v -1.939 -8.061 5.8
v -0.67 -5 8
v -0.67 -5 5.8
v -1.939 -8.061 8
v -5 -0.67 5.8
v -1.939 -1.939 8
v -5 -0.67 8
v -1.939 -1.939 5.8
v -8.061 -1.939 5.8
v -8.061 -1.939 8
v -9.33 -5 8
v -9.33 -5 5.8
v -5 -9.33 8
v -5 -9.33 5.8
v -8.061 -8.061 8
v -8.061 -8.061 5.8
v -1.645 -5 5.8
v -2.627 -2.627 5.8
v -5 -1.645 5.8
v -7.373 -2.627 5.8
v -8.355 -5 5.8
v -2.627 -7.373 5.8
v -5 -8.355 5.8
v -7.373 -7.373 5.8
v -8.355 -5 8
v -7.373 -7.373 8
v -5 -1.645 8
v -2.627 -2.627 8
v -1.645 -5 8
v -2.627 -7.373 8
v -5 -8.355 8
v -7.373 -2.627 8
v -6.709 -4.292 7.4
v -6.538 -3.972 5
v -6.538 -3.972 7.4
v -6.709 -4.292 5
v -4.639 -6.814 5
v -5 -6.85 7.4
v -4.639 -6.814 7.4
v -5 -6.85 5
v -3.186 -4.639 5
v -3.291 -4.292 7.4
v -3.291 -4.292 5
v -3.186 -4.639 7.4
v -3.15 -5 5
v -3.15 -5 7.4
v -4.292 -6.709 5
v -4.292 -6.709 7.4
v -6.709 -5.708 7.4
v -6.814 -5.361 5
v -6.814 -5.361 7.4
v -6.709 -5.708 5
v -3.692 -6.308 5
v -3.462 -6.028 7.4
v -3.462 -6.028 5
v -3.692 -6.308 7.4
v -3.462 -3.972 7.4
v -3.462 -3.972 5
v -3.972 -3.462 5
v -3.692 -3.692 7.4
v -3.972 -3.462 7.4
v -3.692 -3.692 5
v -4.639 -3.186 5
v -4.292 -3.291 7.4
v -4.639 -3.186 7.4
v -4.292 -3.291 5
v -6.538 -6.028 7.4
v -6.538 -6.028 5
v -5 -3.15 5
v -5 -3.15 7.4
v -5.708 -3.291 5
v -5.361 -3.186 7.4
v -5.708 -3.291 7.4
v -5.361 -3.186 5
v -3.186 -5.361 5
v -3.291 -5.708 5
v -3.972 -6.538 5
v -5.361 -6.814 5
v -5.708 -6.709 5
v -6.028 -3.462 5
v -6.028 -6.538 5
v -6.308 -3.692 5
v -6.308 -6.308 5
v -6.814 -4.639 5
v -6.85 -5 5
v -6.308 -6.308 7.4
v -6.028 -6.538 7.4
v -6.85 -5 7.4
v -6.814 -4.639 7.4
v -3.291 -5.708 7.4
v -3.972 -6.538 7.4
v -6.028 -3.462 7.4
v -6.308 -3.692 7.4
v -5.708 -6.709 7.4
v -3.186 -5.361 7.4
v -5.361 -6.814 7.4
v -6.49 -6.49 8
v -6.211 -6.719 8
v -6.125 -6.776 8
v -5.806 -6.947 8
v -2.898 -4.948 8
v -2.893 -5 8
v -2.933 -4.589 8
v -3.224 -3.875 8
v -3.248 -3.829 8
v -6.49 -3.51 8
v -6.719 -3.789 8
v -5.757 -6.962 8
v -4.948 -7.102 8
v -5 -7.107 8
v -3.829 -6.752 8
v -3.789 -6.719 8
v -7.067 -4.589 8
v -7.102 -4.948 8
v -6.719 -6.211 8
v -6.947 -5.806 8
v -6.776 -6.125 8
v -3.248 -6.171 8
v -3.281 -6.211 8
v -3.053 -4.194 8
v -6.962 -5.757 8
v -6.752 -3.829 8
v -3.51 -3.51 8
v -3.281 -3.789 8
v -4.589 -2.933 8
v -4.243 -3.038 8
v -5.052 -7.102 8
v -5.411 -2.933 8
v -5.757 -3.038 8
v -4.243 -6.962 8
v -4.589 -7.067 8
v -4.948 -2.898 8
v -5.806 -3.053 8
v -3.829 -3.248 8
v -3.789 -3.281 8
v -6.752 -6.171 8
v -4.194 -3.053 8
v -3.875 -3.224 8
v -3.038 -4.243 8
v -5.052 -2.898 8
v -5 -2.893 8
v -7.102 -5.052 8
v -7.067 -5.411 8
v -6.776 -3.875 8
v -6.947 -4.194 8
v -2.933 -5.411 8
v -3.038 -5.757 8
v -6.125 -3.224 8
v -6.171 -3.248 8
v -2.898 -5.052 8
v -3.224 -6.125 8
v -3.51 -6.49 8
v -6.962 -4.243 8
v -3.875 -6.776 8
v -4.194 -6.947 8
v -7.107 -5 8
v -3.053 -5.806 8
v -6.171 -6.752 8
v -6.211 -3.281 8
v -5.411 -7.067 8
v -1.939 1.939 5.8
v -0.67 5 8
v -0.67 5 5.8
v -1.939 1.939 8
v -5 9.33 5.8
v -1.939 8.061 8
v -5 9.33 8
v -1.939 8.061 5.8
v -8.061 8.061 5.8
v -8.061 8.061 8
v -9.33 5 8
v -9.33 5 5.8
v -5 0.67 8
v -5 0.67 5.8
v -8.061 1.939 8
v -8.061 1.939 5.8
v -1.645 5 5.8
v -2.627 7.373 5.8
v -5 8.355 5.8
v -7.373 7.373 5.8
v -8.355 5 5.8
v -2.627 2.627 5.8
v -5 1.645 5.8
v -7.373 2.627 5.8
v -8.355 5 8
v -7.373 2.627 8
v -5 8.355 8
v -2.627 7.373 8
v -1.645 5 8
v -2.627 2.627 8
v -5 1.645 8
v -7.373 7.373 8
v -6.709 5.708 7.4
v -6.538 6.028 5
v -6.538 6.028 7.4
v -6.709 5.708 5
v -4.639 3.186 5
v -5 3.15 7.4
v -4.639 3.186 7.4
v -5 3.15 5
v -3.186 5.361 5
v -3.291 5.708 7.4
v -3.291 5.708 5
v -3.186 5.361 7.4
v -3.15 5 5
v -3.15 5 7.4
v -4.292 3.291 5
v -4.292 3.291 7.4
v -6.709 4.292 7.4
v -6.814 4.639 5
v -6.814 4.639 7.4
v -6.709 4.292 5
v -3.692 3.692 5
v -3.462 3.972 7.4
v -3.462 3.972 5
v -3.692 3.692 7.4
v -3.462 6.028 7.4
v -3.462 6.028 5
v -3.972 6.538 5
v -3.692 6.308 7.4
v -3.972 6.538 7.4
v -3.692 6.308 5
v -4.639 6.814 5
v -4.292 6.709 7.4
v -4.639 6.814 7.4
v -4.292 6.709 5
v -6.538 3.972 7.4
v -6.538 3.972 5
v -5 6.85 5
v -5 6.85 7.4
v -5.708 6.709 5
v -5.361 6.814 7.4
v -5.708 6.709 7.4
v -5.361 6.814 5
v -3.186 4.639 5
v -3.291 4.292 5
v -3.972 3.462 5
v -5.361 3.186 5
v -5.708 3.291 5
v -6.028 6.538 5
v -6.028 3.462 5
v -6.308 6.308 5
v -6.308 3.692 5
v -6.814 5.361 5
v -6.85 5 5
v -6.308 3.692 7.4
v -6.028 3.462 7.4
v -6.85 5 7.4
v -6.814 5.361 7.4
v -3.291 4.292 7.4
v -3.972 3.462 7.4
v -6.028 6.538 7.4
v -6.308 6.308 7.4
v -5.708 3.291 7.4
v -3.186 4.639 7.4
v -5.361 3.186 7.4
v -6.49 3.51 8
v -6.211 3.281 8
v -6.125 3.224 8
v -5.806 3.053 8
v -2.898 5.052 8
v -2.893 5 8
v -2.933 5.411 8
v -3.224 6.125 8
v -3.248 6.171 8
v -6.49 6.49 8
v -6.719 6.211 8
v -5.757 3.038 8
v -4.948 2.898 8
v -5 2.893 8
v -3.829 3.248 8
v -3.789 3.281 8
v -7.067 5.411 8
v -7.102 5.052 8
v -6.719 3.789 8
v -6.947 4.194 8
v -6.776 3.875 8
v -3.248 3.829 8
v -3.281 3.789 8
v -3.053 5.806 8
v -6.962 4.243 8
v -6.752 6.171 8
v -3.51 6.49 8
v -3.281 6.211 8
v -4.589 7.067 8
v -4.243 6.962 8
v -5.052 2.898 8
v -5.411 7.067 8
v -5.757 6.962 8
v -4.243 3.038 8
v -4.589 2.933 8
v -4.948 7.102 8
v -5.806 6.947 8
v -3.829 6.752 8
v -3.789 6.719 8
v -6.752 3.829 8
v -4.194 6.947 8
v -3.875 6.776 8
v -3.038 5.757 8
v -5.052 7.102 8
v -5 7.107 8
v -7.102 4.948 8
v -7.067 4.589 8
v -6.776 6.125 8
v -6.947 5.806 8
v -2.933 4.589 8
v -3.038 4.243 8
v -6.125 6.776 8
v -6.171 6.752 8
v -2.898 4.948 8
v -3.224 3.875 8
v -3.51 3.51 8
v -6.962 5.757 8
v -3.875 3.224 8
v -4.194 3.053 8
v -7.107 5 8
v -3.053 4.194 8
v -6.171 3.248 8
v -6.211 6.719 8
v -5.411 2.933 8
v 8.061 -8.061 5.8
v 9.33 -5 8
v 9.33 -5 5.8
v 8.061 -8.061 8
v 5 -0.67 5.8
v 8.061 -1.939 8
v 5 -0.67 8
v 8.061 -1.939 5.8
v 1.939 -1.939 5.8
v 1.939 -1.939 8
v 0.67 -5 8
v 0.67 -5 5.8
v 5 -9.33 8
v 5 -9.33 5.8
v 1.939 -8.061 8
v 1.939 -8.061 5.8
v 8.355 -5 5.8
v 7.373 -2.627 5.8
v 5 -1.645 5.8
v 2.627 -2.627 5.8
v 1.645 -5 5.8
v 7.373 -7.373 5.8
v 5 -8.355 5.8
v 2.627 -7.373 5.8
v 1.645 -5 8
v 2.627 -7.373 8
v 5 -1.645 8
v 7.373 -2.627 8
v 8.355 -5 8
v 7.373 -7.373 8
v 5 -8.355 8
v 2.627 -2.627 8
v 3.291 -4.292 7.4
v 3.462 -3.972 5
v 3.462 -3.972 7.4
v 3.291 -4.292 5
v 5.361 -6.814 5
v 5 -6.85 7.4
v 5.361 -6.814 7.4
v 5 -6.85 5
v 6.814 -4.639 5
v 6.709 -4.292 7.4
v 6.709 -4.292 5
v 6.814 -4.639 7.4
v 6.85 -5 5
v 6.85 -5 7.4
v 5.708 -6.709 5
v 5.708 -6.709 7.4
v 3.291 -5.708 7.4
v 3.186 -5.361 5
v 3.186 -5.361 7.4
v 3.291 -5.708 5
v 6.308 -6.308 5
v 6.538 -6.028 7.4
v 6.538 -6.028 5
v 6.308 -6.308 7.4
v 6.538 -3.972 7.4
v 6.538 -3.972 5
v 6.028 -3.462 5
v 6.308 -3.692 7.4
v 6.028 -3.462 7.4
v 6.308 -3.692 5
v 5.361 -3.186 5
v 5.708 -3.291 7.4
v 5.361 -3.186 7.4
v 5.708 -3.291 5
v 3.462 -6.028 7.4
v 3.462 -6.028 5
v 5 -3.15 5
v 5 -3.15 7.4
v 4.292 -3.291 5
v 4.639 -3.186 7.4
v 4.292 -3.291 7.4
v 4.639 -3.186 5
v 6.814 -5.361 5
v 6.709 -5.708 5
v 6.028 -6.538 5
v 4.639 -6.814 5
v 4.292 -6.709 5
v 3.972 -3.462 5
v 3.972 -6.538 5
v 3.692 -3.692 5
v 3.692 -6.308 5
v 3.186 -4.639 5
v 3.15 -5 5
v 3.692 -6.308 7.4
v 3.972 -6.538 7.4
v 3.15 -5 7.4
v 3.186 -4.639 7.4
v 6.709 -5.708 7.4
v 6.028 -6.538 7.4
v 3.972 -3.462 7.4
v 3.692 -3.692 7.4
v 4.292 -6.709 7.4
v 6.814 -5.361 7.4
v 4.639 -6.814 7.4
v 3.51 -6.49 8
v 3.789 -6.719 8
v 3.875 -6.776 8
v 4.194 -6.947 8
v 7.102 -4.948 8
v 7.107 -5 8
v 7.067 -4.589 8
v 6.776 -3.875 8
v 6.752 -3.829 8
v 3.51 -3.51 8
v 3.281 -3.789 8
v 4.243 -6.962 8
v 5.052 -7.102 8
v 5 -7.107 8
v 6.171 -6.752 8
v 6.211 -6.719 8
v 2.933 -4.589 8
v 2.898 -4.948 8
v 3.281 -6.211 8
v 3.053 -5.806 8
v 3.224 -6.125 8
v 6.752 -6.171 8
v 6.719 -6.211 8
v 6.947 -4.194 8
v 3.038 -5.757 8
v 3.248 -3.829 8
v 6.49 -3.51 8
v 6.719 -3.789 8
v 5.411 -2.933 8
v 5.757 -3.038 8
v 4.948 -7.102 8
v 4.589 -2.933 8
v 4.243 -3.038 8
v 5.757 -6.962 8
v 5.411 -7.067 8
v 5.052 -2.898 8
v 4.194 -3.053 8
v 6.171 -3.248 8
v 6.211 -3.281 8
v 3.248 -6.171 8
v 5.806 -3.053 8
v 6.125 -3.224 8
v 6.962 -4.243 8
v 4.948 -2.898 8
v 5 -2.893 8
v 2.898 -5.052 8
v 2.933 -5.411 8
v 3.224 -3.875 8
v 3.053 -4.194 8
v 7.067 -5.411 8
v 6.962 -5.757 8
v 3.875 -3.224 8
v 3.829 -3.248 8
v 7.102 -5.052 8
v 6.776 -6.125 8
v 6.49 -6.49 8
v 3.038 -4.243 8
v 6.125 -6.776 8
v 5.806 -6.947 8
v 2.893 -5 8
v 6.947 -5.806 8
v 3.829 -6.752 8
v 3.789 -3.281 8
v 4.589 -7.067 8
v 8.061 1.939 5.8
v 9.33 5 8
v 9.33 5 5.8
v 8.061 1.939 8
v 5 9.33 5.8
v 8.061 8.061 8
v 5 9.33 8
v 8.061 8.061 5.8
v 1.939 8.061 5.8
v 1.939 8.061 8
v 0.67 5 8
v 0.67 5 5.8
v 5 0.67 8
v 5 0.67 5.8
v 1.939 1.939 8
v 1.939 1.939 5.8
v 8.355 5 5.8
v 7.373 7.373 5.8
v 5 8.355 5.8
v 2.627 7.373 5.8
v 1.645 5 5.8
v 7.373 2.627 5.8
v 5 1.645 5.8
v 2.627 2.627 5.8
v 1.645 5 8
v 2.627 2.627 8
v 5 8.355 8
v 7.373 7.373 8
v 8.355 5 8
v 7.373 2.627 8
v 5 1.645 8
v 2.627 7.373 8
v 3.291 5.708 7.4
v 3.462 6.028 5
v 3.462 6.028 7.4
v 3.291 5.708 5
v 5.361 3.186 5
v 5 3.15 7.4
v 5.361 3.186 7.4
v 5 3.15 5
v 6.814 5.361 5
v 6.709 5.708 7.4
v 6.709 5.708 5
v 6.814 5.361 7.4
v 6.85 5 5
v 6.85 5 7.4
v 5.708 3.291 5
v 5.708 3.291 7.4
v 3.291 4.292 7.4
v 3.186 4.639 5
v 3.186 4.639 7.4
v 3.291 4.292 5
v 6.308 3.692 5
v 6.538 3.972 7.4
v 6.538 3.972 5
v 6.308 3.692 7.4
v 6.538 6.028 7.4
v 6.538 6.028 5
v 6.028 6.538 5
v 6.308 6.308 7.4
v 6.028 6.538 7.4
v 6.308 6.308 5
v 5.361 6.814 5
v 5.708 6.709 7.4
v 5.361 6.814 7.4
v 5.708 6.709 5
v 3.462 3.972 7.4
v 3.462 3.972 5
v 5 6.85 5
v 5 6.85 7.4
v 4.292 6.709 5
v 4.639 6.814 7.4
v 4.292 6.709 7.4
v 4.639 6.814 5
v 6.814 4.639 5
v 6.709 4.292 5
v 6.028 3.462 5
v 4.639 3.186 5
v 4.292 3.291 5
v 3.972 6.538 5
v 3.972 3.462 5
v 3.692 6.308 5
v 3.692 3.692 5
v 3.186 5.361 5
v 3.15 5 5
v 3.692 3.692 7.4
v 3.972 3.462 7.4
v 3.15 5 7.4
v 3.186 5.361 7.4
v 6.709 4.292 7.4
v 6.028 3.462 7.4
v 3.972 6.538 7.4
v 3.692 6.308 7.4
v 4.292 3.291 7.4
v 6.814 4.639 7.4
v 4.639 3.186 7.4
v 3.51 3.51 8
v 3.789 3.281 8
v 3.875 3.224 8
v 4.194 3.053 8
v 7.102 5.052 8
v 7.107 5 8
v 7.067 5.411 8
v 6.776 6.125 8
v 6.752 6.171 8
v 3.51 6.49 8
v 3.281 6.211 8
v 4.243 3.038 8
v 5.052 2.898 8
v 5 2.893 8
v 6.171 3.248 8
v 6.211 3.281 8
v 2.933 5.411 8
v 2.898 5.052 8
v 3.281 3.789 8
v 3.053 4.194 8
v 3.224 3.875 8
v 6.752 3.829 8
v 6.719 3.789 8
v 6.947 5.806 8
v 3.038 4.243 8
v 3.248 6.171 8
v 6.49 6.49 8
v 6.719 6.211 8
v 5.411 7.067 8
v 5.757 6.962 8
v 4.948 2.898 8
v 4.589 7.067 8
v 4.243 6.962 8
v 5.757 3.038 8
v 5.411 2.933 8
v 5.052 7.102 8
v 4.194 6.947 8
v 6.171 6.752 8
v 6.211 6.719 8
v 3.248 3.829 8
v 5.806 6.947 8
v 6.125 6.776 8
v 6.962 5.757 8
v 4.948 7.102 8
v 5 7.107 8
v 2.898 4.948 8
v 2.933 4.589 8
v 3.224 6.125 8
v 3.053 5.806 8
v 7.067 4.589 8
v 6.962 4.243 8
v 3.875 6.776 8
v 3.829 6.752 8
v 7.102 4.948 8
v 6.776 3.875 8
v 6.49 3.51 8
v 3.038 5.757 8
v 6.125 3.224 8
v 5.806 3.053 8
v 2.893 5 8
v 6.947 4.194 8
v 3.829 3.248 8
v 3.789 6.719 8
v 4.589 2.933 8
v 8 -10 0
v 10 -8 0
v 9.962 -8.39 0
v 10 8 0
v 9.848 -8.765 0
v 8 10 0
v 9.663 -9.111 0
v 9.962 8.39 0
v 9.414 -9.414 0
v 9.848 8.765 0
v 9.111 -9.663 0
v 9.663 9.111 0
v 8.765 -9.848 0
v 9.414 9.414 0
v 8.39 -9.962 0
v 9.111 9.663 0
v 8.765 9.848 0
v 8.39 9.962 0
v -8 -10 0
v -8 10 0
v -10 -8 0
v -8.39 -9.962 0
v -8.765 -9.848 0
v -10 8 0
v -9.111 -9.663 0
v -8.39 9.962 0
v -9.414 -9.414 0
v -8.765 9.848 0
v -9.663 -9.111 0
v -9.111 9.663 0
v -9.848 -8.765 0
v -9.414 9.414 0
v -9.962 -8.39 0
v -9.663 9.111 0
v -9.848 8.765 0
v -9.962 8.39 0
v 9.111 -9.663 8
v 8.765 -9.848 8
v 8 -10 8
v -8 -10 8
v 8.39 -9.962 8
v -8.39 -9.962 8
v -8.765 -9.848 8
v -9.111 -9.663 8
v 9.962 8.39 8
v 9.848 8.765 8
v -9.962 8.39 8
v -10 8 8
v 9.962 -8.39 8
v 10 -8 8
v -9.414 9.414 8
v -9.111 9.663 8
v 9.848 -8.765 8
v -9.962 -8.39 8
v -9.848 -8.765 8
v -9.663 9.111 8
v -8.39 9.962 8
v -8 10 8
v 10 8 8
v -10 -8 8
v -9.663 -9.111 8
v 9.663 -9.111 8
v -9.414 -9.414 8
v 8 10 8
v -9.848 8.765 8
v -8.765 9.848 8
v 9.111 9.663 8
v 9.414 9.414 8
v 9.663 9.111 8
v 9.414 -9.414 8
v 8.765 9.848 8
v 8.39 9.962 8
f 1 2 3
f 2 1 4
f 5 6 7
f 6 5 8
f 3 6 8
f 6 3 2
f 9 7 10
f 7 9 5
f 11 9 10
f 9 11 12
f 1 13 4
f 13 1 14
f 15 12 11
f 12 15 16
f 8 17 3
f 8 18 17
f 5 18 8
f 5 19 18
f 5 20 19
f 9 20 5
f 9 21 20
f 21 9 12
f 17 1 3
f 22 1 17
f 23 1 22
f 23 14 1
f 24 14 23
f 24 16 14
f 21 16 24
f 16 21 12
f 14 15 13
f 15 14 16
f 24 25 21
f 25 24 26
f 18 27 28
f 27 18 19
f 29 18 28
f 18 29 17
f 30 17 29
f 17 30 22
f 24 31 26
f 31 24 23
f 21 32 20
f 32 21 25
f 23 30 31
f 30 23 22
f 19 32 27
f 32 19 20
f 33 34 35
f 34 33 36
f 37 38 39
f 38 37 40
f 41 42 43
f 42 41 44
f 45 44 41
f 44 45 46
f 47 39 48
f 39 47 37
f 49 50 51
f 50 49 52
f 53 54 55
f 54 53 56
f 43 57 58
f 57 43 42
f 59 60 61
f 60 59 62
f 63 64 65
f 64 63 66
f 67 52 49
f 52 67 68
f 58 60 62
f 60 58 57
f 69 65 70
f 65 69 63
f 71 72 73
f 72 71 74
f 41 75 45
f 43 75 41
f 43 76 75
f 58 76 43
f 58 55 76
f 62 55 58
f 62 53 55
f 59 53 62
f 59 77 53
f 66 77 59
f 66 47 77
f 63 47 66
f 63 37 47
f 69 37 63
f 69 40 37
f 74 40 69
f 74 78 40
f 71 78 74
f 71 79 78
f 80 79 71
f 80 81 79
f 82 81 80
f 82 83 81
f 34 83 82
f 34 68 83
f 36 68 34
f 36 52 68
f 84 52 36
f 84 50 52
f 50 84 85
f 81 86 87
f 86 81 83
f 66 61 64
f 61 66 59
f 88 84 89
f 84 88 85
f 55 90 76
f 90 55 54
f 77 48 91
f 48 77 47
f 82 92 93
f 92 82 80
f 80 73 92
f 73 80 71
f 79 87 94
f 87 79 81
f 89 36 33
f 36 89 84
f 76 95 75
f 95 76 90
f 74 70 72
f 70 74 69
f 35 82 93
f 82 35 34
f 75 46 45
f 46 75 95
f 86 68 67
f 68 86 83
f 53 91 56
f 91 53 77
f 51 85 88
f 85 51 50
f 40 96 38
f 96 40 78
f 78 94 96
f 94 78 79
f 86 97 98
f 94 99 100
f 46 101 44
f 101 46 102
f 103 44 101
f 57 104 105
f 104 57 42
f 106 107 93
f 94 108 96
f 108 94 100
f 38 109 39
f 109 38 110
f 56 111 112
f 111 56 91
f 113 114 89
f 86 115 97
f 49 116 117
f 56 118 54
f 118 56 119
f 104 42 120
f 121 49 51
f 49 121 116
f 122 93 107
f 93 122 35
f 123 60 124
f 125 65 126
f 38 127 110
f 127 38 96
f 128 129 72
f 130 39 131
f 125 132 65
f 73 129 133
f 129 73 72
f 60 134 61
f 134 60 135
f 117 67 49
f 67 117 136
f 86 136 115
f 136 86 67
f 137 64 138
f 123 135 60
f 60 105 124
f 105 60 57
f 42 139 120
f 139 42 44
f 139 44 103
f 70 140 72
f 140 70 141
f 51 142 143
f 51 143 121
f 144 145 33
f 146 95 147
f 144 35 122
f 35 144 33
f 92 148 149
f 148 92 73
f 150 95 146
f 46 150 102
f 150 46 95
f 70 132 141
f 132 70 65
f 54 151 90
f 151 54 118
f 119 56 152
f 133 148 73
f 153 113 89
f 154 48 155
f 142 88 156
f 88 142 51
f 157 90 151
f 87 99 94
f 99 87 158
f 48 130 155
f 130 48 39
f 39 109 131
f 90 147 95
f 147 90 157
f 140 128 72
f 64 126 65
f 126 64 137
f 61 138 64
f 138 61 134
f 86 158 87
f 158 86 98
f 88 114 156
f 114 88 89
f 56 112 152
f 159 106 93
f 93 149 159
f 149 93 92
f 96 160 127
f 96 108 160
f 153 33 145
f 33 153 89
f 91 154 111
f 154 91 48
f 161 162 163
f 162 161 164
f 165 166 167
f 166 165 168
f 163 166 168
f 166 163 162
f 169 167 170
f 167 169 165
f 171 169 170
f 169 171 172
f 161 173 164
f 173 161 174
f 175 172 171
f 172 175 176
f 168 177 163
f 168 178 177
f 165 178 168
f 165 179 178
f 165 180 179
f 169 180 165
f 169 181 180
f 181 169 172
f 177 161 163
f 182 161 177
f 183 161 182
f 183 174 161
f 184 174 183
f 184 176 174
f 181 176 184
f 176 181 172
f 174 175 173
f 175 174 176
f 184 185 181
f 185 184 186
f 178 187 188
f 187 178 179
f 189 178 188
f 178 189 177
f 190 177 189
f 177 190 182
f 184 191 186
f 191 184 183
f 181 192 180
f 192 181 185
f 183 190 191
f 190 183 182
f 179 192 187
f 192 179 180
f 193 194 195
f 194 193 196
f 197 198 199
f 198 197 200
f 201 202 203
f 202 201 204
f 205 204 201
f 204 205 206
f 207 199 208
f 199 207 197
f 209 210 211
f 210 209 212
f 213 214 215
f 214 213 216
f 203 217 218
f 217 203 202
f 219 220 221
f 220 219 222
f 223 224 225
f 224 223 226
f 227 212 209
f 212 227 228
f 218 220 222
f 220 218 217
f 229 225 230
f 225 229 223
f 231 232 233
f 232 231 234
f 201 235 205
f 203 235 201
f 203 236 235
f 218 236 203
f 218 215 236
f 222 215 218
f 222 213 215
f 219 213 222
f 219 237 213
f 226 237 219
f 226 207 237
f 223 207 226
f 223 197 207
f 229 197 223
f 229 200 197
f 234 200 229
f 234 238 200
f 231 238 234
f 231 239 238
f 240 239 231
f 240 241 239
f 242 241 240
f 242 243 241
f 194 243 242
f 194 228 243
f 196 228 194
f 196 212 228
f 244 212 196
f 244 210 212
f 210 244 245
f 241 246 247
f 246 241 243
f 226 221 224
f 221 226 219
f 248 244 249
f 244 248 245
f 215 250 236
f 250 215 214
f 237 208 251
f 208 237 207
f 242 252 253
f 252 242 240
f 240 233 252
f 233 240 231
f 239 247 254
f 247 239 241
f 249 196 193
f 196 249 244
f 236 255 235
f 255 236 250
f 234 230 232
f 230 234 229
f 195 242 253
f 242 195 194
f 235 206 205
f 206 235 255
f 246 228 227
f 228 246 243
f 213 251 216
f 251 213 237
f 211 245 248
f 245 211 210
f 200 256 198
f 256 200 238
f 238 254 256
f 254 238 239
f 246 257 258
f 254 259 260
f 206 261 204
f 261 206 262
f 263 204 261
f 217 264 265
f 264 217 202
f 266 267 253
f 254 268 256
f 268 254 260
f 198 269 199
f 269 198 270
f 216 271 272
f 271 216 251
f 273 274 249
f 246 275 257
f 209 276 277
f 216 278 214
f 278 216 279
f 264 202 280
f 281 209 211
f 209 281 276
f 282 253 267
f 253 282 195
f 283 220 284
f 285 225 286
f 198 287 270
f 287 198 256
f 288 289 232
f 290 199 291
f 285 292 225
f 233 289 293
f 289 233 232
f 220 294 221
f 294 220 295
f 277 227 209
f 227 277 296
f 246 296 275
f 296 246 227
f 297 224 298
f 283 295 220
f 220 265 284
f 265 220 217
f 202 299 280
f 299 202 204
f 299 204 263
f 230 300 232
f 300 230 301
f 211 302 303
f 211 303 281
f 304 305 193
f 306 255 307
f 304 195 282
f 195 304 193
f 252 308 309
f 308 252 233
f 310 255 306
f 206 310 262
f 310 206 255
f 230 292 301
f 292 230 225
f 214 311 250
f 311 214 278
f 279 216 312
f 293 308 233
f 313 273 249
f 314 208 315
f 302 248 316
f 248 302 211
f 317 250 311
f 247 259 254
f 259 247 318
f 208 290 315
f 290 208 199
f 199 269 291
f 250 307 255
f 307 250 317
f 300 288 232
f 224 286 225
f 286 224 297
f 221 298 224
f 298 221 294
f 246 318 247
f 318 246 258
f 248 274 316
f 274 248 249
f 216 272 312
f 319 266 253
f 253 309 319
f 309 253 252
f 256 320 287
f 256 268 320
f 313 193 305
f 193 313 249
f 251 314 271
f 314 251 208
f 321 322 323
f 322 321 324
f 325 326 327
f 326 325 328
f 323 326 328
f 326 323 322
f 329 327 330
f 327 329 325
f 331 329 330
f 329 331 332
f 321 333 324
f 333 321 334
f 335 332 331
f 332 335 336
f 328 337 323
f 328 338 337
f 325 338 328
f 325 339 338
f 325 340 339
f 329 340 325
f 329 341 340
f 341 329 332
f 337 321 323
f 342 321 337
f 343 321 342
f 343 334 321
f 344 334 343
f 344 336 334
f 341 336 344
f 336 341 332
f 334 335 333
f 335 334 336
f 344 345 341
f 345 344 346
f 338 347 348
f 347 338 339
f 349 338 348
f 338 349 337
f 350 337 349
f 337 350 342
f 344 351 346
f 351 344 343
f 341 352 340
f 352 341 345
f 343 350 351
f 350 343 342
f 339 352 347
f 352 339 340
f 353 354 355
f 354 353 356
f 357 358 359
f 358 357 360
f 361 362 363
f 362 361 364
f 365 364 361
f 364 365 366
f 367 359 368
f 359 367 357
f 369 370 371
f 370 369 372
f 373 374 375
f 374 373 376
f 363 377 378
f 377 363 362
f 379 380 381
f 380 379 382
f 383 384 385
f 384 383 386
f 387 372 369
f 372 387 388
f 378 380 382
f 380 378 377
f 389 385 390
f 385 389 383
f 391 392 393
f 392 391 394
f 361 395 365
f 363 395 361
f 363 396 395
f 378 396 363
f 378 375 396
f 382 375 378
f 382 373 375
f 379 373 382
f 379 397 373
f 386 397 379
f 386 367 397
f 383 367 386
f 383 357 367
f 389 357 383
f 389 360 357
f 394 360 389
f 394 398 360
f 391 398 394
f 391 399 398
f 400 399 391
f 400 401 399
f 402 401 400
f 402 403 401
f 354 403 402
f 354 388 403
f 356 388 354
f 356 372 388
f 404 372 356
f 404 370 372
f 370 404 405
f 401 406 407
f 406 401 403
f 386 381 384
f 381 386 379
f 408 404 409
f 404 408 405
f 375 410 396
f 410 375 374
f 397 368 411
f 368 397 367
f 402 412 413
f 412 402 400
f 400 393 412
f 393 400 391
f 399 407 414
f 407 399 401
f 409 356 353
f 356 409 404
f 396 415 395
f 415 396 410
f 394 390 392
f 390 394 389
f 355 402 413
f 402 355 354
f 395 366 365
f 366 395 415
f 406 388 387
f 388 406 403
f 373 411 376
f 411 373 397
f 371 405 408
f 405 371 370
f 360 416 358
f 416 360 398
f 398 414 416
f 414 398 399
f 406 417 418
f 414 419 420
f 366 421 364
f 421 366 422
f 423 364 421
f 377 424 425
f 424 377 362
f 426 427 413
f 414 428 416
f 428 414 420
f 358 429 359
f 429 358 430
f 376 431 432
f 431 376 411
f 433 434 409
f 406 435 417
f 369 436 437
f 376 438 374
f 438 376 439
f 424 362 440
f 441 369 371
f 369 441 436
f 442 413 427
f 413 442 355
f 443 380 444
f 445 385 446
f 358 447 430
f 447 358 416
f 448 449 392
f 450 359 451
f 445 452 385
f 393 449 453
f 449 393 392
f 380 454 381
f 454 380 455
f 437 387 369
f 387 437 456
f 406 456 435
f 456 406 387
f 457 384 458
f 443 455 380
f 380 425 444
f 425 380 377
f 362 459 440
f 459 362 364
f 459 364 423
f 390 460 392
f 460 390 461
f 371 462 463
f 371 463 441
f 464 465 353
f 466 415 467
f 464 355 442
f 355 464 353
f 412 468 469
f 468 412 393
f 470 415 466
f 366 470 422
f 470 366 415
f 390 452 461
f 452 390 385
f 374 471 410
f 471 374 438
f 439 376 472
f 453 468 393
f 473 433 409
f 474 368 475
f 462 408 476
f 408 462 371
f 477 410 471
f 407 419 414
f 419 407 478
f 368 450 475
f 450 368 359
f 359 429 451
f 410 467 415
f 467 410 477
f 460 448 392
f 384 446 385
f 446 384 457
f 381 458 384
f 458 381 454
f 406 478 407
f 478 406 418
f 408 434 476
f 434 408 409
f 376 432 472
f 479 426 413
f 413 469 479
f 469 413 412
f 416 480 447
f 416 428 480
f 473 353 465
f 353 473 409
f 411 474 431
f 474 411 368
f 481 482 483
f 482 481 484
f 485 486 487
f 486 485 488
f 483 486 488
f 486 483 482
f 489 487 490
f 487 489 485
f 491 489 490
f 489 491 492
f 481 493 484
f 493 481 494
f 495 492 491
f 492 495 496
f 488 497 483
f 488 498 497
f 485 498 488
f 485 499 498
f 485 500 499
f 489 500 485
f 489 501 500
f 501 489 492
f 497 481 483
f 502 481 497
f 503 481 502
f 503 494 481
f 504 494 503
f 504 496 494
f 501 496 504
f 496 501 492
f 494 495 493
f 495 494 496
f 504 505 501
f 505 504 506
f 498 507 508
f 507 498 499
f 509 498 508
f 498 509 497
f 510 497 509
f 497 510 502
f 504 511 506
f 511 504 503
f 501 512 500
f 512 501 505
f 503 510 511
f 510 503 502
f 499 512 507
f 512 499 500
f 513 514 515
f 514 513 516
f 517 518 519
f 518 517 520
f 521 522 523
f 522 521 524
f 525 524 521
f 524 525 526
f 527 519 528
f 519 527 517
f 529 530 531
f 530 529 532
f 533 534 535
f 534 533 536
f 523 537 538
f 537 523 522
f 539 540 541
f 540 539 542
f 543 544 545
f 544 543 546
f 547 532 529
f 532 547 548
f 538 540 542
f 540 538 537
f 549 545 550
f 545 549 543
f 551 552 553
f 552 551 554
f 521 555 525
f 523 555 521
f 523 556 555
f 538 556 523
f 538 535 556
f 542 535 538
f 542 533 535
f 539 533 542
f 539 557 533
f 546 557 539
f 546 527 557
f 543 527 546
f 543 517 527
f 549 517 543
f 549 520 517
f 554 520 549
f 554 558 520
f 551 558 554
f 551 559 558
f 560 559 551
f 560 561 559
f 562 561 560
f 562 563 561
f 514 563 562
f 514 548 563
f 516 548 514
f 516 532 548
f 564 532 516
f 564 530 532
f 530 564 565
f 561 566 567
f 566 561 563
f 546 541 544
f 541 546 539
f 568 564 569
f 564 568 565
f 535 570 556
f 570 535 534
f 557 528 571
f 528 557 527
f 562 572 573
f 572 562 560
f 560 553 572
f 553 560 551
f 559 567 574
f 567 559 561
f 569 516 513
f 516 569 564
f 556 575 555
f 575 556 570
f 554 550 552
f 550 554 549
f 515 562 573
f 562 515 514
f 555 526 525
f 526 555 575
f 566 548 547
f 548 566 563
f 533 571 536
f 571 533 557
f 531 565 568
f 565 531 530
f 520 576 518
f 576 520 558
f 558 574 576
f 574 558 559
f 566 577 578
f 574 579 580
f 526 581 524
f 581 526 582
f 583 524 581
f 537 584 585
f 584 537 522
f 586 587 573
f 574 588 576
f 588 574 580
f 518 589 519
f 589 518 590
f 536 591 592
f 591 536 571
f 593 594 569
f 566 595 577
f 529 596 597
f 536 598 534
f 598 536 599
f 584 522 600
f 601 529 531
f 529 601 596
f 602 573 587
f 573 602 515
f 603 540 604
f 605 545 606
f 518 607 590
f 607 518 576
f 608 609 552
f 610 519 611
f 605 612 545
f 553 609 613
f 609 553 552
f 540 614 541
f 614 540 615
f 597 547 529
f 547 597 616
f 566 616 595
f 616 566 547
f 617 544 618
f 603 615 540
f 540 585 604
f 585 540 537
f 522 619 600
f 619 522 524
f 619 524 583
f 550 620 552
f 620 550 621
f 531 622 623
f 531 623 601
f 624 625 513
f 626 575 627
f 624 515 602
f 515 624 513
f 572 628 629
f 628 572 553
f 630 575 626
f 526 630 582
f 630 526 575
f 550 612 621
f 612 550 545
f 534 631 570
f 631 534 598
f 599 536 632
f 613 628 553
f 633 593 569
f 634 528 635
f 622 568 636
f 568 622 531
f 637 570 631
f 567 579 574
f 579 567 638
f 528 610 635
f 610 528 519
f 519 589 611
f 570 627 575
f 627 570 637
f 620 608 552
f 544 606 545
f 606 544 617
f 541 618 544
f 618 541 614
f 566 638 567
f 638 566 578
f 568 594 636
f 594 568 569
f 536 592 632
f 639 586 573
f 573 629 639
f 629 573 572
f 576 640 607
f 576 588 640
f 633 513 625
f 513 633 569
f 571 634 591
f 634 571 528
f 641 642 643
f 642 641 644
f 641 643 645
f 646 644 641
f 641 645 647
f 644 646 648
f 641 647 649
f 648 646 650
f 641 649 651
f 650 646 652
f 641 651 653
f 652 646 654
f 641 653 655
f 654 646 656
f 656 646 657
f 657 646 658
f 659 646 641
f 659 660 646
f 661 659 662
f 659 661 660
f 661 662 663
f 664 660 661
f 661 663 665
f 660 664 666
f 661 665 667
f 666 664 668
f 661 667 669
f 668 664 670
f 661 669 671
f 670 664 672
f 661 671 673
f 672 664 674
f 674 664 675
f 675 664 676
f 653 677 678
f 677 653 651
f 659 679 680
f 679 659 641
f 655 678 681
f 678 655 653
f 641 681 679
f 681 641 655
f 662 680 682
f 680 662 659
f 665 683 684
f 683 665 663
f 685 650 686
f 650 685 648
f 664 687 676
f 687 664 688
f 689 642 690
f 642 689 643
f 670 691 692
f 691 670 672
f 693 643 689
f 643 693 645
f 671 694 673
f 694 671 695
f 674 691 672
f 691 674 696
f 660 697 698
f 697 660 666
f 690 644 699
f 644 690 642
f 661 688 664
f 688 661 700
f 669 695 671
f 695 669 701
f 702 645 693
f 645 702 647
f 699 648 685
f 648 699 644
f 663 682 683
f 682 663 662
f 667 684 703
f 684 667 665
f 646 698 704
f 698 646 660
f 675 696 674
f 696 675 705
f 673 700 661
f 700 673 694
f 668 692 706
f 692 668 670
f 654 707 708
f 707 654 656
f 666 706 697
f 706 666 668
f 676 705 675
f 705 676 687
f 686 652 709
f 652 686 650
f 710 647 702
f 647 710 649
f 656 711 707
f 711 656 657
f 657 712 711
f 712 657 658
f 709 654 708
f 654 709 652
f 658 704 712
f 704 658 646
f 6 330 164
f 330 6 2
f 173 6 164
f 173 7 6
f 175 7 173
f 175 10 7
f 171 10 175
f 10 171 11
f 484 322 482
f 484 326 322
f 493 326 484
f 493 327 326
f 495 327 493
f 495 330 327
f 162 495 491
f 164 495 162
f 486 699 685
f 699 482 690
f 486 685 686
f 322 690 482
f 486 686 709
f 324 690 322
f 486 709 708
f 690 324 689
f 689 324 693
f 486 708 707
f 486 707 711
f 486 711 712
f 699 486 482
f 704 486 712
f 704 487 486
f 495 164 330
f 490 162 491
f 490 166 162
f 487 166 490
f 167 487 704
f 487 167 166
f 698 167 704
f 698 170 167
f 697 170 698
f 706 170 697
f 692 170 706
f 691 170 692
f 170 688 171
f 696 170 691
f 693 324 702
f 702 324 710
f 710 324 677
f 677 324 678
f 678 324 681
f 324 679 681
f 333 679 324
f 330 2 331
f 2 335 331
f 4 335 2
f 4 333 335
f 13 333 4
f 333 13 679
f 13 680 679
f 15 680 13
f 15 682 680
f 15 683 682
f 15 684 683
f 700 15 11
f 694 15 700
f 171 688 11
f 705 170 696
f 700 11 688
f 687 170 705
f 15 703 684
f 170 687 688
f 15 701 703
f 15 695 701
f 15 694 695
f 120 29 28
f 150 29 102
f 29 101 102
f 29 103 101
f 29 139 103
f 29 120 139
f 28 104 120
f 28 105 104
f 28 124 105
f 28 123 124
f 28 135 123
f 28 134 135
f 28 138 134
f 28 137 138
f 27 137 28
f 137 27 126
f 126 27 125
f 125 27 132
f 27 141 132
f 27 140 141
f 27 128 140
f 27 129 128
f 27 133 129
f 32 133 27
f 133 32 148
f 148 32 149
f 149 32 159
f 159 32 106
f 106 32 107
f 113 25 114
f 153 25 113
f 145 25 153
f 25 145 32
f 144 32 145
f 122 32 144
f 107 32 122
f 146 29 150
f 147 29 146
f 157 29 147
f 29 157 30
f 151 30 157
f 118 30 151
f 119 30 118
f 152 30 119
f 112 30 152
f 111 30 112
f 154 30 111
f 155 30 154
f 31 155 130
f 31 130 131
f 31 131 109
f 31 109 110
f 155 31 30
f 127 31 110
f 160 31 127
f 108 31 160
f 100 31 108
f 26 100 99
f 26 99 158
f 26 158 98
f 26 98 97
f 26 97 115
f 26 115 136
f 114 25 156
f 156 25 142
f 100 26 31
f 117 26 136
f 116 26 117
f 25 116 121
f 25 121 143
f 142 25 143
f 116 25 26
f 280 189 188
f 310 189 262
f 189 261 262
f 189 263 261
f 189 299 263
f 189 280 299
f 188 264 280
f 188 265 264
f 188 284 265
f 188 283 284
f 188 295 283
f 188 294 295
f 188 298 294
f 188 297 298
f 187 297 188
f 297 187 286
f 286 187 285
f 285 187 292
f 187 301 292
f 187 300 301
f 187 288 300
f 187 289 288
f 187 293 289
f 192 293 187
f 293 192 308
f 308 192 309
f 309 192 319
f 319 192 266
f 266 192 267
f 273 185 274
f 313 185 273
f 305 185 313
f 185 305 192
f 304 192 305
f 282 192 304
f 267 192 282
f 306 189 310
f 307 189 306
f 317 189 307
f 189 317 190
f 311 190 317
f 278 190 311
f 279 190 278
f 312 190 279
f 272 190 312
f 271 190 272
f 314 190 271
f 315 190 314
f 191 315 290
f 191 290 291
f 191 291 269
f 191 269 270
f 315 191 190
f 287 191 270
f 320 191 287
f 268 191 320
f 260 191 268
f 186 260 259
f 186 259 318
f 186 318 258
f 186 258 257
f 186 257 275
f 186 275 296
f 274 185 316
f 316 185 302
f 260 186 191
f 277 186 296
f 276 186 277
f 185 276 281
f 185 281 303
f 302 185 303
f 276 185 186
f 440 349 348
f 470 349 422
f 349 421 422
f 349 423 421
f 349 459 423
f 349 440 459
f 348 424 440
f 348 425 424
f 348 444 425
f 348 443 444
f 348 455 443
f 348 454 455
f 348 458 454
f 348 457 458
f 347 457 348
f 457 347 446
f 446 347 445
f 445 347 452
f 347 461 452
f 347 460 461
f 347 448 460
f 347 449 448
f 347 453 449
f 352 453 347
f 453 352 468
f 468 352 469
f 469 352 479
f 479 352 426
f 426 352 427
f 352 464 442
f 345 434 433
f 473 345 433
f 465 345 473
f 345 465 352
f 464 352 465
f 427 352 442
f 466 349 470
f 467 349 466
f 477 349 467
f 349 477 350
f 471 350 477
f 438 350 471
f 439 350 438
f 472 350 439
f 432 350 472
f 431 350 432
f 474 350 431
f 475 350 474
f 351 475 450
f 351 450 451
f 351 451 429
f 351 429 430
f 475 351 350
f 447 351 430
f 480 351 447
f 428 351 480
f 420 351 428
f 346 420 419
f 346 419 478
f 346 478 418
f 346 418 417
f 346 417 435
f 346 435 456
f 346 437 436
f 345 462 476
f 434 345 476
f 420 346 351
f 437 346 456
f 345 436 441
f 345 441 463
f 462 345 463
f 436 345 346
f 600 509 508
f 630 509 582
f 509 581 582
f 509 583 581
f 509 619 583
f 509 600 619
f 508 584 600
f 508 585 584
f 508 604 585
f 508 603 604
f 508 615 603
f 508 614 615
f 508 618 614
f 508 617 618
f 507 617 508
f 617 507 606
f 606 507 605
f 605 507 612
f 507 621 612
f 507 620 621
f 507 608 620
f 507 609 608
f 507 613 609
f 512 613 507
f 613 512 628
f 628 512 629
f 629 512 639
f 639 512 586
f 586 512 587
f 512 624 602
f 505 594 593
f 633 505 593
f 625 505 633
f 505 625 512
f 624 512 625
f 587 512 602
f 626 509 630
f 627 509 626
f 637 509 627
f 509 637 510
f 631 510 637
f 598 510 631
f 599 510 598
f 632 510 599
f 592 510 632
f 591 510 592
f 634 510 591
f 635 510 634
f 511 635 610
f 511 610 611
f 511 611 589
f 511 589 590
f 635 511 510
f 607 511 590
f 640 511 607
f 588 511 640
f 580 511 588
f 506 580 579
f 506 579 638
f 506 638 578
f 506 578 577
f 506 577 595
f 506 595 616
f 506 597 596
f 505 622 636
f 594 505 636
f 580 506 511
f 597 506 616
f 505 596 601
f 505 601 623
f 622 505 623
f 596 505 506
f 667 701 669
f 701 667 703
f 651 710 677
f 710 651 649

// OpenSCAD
include <../source/rm_system.scad>
tolerance_female_tile();
